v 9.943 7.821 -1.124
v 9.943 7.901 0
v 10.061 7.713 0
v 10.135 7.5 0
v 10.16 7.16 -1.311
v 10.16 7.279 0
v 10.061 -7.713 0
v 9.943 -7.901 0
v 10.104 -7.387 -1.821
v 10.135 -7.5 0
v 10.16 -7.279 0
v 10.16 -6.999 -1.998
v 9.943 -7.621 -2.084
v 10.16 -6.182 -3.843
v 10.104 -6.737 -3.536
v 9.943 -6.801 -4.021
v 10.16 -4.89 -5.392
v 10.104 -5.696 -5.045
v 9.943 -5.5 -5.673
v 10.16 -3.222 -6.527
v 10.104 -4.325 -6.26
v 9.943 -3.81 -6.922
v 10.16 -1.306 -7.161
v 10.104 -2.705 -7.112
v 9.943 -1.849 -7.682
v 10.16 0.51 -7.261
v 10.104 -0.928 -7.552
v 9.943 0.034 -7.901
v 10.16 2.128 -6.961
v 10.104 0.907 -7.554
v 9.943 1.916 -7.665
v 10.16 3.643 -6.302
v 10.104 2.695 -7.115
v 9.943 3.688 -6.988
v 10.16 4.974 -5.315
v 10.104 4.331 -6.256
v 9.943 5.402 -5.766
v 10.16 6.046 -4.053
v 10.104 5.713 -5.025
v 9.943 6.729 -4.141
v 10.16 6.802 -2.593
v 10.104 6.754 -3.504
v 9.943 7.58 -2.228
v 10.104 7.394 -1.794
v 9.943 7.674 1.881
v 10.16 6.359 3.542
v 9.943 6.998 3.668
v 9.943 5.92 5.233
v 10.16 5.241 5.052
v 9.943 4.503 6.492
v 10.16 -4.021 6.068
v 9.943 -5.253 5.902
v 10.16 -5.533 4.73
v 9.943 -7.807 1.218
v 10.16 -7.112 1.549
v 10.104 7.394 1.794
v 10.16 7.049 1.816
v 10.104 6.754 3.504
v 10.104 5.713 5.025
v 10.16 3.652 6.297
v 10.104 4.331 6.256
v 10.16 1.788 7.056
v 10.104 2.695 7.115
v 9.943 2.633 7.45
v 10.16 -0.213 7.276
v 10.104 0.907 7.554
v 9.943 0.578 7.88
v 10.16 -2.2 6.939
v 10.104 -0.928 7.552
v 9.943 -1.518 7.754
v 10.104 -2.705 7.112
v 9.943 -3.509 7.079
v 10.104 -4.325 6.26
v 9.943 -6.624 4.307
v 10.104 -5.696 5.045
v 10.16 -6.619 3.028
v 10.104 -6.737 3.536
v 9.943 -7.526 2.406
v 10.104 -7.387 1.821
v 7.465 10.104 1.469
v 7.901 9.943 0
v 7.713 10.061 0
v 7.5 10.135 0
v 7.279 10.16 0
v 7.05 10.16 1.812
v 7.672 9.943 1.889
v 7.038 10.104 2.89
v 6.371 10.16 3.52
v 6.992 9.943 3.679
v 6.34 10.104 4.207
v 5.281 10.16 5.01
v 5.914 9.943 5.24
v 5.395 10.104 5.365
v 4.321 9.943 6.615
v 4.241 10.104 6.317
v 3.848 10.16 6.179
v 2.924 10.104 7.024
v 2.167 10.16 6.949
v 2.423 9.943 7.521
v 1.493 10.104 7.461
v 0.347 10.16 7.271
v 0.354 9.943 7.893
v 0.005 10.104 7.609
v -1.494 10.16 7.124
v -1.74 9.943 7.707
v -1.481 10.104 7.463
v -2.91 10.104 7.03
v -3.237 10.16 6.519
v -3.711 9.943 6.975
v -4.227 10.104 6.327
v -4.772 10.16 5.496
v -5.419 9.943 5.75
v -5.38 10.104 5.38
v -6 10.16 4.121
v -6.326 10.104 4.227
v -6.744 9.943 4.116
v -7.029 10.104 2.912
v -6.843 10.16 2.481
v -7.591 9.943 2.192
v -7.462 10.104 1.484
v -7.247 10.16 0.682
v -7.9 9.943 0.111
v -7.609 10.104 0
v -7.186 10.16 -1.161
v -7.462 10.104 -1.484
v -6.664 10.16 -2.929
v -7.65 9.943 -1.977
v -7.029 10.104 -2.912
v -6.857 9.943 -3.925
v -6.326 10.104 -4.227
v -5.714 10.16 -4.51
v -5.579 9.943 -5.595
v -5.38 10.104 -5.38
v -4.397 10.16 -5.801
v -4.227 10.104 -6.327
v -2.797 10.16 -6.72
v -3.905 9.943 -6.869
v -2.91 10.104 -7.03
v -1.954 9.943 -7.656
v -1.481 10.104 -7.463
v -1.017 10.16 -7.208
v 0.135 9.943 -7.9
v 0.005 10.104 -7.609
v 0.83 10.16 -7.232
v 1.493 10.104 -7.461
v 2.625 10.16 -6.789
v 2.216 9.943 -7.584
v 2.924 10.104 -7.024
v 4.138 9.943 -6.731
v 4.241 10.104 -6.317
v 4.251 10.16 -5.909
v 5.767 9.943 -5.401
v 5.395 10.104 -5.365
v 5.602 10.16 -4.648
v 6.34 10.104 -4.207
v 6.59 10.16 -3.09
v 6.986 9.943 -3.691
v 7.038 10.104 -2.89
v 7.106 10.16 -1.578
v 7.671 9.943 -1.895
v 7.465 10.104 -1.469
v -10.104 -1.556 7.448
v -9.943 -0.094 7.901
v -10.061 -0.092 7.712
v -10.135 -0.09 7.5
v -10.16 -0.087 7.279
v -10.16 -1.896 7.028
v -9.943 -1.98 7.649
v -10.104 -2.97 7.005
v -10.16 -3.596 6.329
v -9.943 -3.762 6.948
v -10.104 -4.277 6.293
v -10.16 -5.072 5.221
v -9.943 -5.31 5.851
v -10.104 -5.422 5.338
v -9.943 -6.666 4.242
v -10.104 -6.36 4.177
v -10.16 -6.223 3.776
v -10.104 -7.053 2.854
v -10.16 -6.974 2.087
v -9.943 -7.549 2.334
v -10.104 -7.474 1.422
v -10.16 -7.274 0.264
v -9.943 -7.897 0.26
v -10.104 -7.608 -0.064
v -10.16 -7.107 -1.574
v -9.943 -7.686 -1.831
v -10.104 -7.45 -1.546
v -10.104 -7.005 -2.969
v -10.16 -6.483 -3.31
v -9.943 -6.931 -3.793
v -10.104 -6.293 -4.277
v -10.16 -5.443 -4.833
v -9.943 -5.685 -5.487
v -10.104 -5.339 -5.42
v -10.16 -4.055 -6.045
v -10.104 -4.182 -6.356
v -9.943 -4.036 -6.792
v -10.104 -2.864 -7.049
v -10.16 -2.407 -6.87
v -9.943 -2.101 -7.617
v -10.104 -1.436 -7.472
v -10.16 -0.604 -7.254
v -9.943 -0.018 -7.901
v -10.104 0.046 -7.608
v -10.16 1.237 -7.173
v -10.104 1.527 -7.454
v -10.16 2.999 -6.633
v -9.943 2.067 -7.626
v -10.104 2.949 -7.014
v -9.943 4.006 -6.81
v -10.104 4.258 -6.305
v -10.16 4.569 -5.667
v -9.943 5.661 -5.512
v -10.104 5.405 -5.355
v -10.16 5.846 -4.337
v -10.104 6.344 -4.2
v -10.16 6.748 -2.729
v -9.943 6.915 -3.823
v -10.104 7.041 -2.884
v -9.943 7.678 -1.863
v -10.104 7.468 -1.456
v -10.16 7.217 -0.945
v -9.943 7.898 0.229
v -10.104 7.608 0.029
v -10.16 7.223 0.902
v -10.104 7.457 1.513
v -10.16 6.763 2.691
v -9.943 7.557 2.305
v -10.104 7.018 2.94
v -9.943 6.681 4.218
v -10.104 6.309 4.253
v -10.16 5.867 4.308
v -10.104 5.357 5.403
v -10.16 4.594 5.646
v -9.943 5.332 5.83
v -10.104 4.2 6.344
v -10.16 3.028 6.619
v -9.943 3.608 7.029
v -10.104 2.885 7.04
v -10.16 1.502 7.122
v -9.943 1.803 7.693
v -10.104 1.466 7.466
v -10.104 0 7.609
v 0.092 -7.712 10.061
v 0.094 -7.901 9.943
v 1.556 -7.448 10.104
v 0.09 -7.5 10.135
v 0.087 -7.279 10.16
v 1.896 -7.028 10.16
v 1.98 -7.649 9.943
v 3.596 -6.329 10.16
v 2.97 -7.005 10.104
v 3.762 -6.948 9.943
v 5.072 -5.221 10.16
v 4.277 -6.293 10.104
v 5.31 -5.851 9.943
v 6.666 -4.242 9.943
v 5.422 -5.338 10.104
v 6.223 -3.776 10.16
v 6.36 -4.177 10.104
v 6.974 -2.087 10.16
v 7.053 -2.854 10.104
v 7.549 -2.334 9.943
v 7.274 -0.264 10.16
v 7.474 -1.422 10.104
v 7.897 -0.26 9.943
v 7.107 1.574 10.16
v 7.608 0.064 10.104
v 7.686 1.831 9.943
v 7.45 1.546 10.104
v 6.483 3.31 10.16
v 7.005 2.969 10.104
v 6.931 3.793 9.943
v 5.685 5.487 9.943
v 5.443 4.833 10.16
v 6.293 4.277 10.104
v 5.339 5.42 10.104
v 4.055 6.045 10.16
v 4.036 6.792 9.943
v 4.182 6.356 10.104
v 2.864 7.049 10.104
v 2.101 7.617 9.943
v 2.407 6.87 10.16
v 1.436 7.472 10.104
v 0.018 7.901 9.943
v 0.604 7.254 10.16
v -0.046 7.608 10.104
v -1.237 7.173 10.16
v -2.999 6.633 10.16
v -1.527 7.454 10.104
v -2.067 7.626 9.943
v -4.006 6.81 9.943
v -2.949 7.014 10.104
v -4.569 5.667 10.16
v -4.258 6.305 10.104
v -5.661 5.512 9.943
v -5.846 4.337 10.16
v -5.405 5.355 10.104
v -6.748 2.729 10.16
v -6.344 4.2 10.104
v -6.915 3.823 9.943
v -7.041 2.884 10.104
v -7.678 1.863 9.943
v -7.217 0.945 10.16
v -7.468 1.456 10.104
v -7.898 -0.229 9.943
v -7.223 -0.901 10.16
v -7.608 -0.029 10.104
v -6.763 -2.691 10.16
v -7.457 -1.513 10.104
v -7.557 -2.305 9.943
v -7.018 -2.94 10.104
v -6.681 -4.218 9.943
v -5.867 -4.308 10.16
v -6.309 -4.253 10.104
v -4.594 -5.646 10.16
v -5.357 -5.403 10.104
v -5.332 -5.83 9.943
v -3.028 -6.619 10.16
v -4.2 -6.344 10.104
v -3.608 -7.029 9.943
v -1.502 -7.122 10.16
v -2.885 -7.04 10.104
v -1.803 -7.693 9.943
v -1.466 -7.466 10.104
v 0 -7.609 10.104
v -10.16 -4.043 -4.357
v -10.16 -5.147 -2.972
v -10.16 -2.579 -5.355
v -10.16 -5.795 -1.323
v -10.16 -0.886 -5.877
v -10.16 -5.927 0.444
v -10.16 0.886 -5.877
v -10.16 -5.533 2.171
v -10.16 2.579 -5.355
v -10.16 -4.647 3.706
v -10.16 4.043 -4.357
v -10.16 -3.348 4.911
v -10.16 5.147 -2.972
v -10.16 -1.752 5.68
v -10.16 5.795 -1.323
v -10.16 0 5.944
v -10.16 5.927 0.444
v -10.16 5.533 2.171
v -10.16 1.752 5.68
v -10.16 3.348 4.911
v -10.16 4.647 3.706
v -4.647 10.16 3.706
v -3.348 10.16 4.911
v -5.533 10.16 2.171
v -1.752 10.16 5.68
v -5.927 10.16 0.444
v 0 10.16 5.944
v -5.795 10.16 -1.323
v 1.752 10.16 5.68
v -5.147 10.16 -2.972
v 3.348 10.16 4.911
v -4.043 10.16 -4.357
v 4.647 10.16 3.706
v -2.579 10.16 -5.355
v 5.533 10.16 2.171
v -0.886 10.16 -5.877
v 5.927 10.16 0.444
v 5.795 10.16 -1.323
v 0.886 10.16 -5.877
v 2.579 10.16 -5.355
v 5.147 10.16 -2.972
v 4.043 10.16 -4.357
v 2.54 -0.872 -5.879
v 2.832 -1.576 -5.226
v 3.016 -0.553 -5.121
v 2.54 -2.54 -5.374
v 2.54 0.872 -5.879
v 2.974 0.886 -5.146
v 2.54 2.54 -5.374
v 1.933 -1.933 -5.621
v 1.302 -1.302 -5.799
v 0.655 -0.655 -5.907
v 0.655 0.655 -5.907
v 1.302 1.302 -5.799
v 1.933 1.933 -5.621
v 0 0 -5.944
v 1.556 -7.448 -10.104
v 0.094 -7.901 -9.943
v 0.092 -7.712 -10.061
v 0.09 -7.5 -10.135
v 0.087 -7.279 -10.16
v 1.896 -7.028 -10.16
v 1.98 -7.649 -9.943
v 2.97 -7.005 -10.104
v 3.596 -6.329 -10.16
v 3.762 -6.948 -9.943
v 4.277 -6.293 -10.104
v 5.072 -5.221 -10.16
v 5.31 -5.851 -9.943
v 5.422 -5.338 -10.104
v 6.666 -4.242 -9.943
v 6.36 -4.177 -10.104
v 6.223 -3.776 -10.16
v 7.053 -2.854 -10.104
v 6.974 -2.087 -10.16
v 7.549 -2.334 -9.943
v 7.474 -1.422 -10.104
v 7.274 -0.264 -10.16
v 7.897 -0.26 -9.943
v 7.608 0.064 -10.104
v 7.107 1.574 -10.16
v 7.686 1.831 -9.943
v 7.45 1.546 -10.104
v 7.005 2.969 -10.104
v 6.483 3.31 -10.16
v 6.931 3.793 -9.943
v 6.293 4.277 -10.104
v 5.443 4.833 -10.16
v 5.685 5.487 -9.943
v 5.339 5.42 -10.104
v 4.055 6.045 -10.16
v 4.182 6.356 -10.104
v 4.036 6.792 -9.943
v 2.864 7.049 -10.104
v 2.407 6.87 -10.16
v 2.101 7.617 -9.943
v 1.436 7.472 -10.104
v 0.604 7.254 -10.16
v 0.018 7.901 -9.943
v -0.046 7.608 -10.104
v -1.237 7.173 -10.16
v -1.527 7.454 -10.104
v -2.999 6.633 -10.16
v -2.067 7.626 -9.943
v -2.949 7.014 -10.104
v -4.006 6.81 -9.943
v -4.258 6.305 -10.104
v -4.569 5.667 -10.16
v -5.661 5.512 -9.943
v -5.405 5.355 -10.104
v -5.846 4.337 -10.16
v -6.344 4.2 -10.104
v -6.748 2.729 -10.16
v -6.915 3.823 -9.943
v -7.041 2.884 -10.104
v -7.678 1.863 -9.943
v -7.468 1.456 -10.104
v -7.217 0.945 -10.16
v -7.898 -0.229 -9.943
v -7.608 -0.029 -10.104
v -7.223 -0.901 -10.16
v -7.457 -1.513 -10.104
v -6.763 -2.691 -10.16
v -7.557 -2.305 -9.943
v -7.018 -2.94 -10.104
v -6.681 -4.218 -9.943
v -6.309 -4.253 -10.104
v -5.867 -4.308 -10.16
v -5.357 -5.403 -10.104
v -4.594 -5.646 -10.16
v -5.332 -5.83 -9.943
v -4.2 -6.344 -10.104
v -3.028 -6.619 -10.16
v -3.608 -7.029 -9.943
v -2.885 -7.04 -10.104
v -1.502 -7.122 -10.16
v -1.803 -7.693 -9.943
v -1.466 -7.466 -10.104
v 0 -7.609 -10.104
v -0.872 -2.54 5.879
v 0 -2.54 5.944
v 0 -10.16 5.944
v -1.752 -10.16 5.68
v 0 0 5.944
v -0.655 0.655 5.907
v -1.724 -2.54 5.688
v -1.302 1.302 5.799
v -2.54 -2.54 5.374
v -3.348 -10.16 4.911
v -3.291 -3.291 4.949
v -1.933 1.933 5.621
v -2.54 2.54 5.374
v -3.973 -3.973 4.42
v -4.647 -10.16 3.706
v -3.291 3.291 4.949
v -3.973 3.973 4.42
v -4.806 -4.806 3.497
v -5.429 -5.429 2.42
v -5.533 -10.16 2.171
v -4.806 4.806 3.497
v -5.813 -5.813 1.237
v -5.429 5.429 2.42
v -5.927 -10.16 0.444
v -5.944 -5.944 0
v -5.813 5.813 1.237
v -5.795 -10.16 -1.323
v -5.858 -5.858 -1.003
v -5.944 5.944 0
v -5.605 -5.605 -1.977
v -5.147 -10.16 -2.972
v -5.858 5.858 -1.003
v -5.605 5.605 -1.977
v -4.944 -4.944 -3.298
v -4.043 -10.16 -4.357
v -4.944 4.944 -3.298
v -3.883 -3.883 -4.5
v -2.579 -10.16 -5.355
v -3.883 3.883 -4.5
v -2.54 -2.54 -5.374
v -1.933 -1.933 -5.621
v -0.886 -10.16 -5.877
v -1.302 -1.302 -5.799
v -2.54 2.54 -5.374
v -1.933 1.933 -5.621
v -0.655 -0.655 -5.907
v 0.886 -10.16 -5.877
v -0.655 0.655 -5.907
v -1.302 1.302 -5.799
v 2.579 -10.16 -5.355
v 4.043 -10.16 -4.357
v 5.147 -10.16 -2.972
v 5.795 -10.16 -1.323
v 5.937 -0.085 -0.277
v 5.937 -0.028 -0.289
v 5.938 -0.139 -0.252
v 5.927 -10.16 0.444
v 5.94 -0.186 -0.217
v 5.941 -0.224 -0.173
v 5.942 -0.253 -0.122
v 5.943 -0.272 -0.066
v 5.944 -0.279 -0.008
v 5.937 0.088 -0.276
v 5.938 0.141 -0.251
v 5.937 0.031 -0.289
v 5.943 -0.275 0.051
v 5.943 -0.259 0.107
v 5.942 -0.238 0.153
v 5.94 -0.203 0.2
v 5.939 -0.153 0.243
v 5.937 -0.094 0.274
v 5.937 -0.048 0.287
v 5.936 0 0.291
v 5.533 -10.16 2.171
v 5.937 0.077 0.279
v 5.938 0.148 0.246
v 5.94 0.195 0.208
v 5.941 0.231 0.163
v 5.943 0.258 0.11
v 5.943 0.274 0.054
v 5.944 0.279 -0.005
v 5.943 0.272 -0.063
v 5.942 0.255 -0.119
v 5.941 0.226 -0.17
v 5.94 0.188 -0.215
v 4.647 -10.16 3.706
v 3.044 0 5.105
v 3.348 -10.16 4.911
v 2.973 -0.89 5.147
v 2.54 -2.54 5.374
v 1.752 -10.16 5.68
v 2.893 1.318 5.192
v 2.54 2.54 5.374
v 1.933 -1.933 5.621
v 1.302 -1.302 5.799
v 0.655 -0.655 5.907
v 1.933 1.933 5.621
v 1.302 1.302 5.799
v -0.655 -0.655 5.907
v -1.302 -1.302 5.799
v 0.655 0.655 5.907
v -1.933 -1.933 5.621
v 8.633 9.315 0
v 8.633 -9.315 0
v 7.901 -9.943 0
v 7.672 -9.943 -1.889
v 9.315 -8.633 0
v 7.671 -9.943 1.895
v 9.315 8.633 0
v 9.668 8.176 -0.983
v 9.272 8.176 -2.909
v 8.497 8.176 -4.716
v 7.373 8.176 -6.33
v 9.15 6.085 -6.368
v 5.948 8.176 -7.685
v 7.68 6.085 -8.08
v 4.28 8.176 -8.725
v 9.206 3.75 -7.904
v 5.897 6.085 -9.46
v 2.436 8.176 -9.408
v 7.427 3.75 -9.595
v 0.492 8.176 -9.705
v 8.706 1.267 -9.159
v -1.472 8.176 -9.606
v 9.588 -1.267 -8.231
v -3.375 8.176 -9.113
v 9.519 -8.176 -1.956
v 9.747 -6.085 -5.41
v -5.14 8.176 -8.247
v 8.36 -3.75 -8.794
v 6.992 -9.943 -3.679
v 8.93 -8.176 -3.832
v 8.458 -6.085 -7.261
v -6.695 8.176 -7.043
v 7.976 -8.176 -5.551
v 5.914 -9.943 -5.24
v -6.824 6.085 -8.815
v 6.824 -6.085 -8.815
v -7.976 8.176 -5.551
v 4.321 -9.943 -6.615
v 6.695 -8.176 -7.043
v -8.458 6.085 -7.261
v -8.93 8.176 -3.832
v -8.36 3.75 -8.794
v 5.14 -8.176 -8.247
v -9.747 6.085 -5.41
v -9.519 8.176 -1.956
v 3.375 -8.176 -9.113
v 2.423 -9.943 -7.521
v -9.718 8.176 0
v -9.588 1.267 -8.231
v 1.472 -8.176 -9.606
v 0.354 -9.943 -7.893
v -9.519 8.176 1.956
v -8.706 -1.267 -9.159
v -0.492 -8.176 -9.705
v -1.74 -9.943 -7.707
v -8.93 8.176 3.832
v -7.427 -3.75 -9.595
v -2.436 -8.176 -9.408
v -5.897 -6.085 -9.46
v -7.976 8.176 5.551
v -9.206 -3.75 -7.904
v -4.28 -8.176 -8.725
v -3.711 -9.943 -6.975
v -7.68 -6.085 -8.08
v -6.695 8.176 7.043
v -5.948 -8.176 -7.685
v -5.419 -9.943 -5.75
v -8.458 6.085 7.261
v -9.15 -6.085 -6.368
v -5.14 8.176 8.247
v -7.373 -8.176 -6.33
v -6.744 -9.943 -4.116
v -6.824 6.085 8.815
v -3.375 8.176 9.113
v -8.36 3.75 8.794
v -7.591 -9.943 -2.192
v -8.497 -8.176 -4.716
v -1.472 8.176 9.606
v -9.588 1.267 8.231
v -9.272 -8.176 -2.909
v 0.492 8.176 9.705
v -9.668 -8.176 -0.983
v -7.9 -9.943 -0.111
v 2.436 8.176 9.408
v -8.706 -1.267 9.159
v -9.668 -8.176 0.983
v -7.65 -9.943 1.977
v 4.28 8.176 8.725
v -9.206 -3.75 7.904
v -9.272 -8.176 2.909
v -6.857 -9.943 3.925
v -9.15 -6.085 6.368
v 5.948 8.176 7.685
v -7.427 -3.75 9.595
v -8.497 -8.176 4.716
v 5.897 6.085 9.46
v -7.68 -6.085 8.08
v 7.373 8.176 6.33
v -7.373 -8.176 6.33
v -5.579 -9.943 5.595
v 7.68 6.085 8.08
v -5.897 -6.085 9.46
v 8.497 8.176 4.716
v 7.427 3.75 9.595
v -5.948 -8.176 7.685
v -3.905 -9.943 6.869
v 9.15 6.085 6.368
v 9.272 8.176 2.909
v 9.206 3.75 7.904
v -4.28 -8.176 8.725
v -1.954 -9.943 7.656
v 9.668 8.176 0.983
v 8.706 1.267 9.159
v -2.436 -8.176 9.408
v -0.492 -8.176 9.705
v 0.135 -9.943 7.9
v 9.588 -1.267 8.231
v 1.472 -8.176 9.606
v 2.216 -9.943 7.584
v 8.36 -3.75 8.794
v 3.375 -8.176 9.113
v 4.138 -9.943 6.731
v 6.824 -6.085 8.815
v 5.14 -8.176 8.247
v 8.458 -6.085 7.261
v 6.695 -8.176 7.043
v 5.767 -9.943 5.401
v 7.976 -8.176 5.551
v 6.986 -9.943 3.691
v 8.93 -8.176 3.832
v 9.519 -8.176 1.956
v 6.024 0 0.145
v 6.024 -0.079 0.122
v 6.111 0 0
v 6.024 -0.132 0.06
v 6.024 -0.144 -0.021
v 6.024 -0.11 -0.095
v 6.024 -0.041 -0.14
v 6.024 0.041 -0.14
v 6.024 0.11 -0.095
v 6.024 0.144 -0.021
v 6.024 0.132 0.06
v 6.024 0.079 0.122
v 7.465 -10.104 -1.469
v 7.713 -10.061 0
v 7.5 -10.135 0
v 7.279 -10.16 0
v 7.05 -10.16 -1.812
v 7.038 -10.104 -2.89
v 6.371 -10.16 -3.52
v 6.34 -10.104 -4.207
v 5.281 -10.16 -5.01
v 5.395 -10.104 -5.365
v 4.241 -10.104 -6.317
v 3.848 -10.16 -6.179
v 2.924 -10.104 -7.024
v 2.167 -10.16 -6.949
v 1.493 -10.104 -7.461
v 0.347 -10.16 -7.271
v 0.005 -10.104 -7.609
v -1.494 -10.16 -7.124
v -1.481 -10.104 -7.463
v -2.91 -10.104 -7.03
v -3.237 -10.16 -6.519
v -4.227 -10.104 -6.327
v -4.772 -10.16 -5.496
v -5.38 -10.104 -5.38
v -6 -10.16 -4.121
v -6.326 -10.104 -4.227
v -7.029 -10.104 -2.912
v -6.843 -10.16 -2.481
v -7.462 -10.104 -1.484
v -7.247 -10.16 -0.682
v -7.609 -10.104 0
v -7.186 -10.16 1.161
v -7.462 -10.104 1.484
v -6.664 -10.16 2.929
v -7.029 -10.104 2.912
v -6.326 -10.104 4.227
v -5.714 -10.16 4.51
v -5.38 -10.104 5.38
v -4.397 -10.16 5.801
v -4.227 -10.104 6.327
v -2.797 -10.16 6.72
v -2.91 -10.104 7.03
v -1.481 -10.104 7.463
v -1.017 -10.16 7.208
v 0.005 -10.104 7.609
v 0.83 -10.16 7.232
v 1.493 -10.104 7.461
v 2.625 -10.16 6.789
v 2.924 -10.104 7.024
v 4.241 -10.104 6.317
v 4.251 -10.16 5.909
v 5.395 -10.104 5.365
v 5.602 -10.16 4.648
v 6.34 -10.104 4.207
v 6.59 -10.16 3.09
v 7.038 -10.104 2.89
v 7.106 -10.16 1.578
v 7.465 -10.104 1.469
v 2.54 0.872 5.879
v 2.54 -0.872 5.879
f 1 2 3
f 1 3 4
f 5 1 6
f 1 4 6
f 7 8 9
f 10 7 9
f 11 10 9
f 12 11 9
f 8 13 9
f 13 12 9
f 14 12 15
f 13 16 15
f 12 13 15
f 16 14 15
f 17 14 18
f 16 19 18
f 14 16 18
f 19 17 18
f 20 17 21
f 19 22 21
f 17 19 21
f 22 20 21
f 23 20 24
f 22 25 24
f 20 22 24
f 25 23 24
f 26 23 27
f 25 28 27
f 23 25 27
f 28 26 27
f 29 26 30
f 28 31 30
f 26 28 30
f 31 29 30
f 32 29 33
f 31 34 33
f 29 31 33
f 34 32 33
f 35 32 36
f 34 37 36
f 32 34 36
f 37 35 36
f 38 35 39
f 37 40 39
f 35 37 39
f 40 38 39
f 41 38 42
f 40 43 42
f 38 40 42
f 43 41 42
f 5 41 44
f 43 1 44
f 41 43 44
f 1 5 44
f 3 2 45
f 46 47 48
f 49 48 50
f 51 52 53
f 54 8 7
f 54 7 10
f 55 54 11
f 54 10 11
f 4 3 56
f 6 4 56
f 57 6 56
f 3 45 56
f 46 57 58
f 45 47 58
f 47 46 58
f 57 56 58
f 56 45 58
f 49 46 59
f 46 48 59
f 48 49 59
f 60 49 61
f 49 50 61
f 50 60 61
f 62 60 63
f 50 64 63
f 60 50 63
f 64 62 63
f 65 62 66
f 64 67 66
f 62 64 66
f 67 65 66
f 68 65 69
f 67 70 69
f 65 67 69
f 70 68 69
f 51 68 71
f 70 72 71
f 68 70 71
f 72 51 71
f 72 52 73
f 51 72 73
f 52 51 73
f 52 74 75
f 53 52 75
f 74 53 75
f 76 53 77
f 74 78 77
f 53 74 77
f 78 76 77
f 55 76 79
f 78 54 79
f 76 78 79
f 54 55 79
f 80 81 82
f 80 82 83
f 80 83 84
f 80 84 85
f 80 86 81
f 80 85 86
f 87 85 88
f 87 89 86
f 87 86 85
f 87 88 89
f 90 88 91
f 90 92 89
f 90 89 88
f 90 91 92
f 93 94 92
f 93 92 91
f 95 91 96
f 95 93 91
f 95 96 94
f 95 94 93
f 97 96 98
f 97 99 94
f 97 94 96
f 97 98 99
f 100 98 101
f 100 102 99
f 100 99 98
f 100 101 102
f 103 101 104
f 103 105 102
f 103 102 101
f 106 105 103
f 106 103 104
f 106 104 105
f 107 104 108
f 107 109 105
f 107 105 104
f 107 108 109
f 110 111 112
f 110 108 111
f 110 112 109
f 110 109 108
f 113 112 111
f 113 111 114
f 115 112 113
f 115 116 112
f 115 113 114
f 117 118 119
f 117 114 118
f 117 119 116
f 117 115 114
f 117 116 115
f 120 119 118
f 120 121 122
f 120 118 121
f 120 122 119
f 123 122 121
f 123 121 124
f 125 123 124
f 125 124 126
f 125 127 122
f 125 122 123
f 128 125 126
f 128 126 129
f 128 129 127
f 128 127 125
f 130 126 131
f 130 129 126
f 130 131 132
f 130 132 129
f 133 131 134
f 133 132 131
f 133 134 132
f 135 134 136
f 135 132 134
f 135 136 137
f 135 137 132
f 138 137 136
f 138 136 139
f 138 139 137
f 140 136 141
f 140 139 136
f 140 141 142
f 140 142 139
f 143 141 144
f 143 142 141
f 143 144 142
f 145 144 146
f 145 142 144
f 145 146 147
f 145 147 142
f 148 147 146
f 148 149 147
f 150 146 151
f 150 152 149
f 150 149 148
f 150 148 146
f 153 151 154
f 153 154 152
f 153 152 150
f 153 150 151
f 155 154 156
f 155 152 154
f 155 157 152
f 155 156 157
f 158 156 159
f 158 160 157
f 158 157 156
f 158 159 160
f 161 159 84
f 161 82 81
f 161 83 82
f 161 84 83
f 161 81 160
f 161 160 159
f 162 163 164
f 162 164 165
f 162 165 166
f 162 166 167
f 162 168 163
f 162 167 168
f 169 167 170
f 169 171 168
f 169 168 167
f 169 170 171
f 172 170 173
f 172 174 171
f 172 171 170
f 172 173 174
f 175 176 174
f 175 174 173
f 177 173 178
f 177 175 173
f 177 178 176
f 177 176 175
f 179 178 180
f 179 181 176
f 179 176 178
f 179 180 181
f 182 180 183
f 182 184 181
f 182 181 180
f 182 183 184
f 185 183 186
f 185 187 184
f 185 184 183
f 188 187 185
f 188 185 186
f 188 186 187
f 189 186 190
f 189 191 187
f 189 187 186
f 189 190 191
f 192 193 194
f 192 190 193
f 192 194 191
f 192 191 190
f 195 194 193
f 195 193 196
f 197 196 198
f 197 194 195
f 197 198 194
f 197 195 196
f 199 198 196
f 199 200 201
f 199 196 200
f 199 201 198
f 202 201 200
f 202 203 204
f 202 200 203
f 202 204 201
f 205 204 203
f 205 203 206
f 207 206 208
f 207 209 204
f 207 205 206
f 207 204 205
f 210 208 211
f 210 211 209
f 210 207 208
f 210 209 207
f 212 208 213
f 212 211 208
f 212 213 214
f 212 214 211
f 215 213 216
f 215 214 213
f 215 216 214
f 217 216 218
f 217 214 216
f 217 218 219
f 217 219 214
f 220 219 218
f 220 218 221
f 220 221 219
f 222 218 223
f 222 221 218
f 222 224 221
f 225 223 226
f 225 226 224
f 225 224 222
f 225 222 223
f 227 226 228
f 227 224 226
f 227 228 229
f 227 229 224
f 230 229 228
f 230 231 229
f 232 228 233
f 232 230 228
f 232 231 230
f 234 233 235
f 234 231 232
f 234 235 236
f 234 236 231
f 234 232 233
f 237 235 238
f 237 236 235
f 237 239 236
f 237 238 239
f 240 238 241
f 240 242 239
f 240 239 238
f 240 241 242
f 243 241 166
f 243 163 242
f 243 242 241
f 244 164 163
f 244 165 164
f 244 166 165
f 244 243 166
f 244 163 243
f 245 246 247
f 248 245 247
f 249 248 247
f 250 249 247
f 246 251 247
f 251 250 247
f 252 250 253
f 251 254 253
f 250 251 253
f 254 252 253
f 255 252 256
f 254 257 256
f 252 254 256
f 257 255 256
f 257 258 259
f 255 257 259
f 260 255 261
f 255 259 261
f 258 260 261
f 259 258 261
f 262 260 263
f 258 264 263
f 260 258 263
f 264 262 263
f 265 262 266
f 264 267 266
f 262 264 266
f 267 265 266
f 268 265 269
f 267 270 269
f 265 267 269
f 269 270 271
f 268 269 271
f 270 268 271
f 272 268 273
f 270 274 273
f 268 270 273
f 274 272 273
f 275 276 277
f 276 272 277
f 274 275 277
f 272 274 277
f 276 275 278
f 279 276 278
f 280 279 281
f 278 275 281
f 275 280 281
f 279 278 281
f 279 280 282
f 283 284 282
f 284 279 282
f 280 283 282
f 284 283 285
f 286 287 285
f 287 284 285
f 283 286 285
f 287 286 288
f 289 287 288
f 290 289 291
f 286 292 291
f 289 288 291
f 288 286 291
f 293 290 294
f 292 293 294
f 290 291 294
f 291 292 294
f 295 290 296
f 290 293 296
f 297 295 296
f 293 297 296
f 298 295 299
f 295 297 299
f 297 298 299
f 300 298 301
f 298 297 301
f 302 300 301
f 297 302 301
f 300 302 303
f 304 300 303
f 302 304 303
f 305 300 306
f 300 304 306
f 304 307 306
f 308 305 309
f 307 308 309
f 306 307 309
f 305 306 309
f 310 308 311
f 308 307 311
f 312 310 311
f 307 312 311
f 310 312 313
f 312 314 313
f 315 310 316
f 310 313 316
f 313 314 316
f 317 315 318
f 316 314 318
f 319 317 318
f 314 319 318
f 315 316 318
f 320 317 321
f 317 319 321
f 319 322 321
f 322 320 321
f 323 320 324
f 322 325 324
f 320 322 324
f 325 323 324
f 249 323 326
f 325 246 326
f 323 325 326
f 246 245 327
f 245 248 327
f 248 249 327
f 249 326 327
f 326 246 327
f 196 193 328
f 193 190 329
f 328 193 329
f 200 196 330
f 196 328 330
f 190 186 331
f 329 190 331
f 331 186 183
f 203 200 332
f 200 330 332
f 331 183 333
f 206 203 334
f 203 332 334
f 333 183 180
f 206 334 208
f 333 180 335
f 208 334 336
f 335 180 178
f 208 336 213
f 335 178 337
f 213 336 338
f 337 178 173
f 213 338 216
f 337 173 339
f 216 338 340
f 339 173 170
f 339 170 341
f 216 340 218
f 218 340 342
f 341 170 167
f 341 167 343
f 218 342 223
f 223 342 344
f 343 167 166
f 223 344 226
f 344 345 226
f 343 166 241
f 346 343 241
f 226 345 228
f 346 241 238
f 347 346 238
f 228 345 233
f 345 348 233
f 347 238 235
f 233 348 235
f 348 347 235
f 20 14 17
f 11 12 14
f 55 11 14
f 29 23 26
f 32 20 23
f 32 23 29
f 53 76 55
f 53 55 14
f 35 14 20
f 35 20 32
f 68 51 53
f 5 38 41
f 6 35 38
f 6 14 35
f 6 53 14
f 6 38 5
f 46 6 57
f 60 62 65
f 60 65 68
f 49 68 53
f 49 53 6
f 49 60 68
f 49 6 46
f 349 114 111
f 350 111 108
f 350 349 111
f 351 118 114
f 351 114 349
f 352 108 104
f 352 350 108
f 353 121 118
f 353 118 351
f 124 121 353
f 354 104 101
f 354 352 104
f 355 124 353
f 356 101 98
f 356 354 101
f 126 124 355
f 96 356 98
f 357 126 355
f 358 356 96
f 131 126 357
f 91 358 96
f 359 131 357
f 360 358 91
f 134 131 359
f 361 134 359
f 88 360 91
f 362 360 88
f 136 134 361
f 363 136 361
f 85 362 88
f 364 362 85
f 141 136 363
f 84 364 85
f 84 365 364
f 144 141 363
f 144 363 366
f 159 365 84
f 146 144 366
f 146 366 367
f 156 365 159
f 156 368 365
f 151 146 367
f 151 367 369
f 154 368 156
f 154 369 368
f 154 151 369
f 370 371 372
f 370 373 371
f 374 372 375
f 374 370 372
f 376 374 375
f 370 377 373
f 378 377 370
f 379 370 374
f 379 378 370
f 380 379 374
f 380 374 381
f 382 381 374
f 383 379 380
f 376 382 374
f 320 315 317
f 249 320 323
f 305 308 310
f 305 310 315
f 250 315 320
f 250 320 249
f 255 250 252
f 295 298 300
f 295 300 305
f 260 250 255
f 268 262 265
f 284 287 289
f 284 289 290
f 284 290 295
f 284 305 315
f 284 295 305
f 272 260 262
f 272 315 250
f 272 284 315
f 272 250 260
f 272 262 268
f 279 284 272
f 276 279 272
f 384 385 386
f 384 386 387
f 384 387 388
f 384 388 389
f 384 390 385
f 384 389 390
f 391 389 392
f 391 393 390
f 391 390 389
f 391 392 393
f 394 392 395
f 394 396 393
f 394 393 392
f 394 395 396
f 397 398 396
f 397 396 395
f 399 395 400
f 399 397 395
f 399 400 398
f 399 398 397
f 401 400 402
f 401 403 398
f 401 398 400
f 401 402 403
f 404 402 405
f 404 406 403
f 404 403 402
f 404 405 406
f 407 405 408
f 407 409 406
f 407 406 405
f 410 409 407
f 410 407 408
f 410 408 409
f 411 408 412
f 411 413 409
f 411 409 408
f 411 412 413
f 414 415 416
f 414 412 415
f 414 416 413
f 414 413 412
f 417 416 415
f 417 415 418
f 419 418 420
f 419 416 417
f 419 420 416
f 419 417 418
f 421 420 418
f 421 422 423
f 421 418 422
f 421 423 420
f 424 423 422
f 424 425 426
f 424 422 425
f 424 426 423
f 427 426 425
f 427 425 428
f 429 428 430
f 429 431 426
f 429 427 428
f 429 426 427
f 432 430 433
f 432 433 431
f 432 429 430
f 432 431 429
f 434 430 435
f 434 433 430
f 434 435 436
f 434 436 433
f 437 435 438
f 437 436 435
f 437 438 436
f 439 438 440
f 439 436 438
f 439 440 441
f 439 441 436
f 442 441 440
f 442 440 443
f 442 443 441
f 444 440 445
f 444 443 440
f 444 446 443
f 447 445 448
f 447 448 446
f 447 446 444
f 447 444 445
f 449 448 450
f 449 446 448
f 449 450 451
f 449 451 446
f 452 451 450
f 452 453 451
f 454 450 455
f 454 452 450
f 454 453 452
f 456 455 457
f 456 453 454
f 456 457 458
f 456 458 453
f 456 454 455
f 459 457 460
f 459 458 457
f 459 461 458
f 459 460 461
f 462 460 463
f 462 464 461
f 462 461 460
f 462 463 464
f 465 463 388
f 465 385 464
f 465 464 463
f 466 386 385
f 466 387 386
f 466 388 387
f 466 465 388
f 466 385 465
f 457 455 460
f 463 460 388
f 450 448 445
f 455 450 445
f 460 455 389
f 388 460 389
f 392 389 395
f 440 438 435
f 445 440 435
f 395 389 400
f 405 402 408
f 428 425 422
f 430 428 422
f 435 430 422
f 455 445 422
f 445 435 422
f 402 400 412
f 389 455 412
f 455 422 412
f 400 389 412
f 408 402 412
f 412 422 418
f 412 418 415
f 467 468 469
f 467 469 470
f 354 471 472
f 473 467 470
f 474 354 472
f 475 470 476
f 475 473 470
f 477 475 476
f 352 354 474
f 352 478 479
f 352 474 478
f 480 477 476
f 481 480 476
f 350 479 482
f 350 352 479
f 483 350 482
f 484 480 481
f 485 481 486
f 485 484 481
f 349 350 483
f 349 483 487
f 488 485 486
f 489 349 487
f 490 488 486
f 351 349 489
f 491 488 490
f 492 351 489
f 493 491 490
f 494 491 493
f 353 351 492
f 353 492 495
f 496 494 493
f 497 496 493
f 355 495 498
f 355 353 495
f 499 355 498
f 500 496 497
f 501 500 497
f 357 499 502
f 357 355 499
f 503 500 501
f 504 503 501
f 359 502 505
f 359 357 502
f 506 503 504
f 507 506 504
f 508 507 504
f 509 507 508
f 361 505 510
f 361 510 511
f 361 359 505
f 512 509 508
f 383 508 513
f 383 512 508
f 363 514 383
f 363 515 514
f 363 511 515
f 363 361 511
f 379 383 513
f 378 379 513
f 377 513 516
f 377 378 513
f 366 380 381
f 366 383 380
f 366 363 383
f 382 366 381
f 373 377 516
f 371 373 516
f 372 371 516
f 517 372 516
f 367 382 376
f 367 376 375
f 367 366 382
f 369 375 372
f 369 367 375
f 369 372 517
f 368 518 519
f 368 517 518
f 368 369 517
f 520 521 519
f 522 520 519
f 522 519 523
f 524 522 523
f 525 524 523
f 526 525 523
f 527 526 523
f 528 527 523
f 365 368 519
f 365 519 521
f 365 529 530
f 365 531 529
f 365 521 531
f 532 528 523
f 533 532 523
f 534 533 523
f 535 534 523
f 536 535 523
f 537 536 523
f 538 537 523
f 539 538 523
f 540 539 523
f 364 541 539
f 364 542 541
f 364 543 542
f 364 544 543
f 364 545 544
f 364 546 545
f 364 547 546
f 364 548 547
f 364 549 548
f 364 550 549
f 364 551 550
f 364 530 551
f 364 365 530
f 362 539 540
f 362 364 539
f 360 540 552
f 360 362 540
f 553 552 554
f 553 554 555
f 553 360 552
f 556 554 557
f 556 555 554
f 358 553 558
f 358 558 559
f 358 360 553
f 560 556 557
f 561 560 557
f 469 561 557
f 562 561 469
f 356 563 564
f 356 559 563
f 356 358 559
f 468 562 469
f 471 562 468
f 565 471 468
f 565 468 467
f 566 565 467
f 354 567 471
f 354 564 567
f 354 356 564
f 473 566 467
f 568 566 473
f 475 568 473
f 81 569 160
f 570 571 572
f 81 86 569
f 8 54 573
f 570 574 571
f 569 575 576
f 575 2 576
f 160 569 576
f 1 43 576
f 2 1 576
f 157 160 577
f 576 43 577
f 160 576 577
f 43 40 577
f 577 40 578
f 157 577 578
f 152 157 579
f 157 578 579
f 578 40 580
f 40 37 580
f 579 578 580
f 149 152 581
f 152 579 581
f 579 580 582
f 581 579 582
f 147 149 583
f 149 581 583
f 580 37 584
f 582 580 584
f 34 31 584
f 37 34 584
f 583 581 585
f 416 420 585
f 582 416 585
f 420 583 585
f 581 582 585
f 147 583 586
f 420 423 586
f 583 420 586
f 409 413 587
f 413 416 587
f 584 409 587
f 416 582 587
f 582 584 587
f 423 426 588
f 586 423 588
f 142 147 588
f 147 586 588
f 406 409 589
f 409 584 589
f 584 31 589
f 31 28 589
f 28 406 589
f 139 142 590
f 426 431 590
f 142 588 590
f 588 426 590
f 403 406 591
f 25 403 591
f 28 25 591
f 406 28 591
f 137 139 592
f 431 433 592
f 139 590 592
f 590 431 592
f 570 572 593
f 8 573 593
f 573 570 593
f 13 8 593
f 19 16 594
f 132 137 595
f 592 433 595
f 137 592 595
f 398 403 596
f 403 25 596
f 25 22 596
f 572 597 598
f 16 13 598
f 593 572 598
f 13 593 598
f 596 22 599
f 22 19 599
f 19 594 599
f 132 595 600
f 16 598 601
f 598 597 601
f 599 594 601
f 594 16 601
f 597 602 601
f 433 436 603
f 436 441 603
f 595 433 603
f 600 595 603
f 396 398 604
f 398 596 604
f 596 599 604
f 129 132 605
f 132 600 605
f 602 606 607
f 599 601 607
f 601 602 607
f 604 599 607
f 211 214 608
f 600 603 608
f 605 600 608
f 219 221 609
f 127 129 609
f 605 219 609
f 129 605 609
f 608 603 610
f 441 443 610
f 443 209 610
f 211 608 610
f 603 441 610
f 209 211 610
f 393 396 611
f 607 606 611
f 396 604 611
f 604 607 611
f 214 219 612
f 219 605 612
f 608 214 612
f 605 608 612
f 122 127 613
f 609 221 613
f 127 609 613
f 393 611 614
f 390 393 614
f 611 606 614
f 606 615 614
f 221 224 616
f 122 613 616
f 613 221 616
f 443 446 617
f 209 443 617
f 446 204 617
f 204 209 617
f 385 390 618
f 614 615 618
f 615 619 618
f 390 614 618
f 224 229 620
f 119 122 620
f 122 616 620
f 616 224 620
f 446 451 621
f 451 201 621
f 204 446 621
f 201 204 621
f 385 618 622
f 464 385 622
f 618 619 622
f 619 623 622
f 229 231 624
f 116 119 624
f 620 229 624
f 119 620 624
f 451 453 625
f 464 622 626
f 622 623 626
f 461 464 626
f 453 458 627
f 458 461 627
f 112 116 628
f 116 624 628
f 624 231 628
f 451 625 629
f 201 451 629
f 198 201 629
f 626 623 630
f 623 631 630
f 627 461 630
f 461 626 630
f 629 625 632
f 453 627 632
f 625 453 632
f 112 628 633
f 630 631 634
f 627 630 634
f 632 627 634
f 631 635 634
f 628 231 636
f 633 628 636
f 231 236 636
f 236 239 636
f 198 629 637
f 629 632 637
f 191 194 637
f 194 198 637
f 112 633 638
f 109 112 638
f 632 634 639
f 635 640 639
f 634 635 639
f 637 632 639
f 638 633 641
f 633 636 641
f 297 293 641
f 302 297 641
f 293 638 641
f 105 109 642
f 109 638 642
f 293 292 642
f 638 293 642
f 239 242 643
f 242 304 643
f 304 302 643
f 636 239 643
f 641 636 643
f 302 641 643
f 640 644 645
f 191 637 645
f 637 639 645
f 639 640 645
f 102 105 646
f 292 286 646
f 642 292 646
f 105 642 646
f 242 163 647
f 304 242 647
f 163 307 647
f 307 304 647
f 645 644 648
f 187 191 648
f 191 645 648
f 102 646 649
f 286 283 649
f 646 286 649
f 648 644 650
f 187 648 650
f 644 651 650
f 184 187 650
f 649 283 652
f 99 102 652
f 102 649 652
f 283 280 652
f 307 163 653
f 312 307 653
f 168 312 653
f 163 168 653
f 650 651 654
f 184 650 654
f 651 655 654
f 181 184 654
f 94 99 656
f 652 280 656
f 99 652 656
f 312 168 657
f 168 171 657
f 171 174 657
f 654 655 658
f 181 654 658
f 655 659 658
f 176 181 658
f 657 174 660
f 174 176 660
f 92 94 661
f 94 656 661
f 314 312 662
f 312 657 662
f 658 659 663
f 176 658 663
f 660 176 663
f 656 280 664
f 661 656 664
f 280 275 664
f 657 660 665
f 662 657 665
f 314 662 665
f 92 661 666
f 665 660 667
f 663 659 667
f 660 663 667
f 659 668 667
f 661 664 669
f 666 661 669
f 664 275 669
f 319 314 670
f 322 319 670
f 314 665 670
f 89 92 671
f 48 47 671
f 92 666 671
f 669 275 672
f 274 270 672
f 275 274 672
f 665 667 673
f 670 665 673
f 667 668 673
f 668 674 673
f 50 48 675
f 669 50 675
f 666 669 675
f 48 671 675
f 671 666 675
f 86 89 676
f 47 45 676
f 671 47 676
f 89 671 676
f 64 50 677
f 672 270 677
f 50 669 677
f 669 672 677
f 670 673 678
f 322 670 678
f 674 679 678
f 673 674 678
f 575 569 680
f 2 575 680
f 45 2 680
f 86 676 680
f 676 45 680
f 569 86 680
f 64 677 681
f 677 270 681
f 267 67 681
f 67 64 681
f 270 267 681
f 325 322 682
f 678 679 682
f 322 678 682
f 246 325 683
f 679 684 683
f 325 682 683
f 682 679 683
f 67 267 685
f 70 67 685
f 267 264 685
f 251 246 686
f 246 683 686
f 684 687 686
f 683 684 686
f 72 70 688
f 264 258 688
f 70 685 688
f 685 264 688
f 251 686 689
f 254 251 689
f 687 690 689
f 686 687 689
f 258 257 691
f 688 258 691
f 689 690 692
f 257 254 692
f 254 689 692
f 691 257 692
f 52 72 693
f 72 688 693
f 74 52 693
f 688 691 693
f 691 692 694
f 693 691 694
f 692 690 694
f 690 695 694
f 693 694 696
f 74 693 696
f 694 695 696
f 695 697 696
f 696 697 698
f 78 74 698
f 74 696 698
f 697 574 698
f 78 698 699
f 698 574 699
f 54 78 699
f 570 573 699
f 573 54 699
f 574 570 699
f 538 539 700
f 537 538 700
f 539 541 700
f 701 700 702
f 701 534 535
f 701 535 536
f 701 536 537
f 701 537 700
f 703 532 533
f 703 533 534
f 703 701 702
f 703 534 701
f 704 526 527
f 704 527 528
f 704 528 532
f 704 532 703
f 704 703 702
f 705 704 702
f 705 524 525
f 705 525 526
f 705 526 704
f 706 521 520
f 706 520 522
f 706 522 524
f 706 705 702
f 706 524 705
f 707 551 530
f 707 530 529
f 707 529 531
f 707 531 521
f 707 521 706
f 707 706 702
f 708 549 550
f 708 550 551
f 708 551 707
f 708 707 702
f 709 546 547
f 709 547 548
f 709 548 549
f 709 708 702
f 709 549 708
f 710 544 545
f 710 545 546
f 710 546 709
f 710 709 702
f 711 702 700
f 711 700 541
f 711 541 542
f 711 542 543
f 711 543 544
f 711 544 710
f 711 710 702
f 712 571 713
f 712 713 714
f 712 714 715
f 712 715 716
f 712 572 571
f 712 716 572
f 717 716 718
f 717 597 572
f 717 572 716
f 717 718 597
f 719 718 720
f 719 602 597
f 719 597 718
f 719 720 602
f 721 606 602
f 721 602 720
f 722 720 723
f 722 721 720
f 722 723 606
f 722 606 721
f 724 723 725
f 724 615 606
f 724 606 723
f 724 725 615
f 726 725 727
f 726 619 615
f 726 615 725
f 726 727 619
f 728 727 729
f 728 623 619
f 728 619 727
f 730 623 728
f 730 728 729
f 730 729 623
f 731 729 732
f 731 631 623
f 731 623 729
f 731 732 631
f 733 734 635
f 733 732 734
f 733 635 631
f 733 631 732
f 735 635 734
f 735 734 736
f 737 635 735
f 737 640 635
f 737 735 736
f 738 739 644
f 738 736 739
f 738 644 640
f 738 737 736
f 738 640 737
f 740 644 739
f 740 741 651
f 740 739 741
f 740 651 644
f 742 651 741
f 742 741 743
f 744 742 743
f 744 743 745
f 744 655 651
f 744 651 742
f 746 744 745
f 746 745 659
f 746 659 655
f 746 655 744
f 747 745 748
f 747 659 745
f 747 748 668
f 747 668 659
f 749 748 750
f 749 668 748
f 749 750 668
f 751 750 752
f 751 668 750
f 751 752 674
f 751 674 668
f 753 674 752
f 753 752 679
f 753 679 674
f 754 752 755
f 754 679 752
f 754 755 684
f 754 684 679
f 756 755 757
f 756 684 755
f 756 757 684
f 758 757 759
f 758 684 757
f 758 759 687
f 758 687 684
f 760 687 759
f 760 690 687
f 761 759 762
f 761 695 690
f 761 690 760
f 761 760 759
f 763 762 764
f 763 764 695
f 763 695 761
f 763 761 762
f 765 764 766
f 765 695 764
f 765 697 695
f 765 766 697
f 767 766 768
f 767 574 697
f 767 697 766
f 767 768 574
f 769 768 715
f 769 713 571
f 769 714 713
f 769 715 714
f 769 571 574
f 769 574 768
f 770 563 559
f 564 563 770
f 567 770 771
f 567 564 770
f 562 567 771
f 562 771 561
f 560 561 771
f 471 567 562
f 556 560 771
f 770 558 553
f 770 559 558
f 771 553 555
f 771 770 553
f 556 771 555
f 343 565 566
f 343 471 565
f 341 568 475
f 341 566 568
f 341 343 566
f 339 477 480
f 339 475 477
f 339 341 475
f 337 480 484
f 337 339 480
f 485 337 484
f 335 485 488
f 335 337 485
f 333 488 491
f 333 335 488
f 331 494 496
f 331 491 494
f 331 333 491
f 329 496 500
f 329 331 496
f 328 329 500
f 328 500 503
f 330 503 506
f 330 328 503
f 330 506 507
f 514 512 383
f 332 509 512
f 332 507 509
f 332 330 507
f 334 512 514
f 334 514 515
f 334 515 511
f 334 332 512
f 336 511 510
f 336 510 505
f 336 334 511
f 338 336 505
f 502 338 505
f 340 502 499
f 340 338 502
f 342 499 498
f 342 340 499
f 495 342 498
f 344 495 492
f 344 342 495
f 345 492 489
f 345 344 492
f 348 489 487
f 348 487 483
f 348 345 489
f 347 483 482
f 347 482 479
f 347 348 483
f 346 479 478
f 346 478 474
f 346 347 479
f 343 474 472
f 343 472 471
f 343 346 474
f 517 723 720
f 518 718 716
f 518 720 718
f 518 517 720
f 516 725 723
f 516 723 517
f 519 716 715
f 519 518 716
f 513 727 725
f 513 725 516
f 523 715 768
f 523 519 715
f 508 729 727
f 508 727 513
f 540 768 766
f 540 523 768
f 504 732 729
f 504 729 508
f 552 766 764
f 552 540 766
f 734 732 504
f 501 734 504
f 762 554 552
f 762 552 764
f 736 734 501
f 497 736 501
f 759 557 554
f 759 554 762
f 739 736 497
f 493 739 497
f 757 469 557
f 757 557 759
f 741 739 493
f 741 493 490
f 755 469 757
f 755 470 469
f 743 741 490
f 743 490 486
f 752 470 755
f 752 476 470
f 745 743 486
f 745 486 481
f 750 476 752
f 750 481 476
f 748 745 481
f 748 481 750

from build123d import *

# Parameters (mm, degrees)
R_P_TITION_START                   = -7.62
R_P_TITION_CIRCULAIRE5_OUTLINE_W   = 3.84
R_P_TITION_CIRCULAIRE5_OUTLINE_H   = 18
R_P_TITION_CIRCULAIRE5_DEPTH       = 15.24
R_P_TITION_START_2                 = -12.7
R_P_TITION_CIRCULAIRE5_2_OUTLINE_W = 19.16
R_P_TITION_CIRCULAIRE5_2_OUTLINE_H = 18
R_P_TITION_CIRCULAIRE5_2_DEPTH     = 2.54
R_P_TITION_START_3                 = 10.16
R_P_TITION_CIRCULAIRE5_3_OUTLINE_W = 19.16
R_P_TITION_CIRCULAIRE5_3_OUTLINE_H = 18
R_P_TITION_CIRCULAIRE5_3_DEPTH     = 2.54
R_P_TITION_CIRCULAIRE6_OUTLINE_W   = 18
R_P_TITION_CIRCULAIRE6_OUTLINE_H   = 18
R_P_TITION_CIRCULAIRE6_DEPTH       = 2.54
R_P_TITION_CIRCULAIRE6_2_OUTLINE_W = 18
R_P_TITION_CIRCULAIRE6_2_OUTLINE_H = 18
R_P_TITION_CIRCULAIRE6_2_DEPTH     = 2.54
CONG_1_R                           = 1
R_P_TITION_CIRCULAIRE7_COUNT       = 3
R_P_TITION_CIRCULAIRE7_ANGLE       = 180


# Read off the part's stored shape, not the designer's step: Répétition circulaire5, Répétition circulaire6
with BuildPart() as part:
    # Esquisse1 → Révolution1 (revolve)
    with BuildSketch(Plane.XY):
        with BuildLine():
            Line((0, -12.7), (0, 12.7))
            ThreePointArc((0, 12.7), (12.7, 0), (0, -12.7))
        make_face()
    revolve(axis=Axis((0, -12.7, 0), (0, 1, 0)))

    # Enlèv. mat.-Surface1
    split(bisect_by=Plane(origin=(0, 10.16, 0), x_dir=(1, 0, 0), z_dir=(0, 1, 0)), keep=Keep.BOTTOM)

    # Répétition circulaire5 outline → Répétition circulaire5 (cut)
    with BuildSketch(Plane.YZ.offset(R_P_TITION_START)):
        with Locations((-12.08, 0)):
            Rectangle(R_P_TITION_CIRCULAIRE5_OUTLINE_W, R_P_TITION_CIRCULAIRE5_OUTLINE_H)
    extrude(amount=R_P_TITION_CIRCULAIRE5_DEPTH, mode=Mode.SUBTRACT)

    # R_p_tition circulaire5 2 outline → R_p_tition circulaire5 2 (cut)
    with BuildSketch(Plane.YZ.offset(R_P_TITION_START_2)):
        with Locations((-0.58, 0)):
            Rectangle(R_P_TITION_CIRCULAIRE5_2_OUTLINE_W, R_P_TITION_CIRCULAIRE5_2_OUTLINE_H)
    extrude(amount=R_P_TITION_CIRCULAIRE5_2_DEPTH, mode=Mode.SUBTRACT)

    # R_p_tition circulaire5 3 outline → R_p_tition circulaire5 3 (cut)
    with BuildSketch(Plane.YZ.offset(R_P_TITION_START_3)):
        with Locations((-0.58, 0)):
            Rectangle(R_P_TITION_CIRCULAIRE5_3_OUTLINE_W, R_P_TITION_CIRCULAIRE5_3_OUTLINE_H)
    extrude(amount=R_P_TITION_CIRCULAIRE5_3_DEPTH, mode=Mode.SUBTRACT)

    # Répétition circulaire6 outline → Répétition circulaire6 (cut)
    with BuildSketch(Plane.XY.offset(R_P_TITION_START_2)):
        Rectangle(R_P_TITION_CIRCULAIRE6_OUTLINE_W, R_P_TITION_CIRCULAIRE6_OUTLINE_H)
    extrude(amount=R_P_TITION_CIRCULAIRE6_DEPTH, mode=Mode.SUBTRACT)

    # R_p_tition circulaire6 2 outline → R_p_tition circulaire6 2 (cut)
    with BuildSketch(Plane.XY.offset(R_P_TITION_START_3)):
        Rectangle(R_P_TITION_CIRCULAIRE6_2_OUTLINE_W, R_P_TITION_CIRCULAIRE6_2_OUTLINE_H)
    extrude(amount=R_P_TITION_CIRCULAIRE6_2_DEPTH, mode=Mode.SUBTRACT)

    # Congé1
    cong_1_edges = [part.edges().sort_by_distance(p)[0] for p in [
        (-10.16, 0, -7.62),
        (-7.62, -10.16, 0),
        (10.16, 0, -7.62),
        (0, 7.62, -10.16),
        (0, 7.62, 10.16),
        (-7.62, 10.16, 0),
    ]]
    fillet(cong_1_edges, radius=CONG_1_R)

    # Esquisse2 → Trou taraudé 1/4-18 NPSM1 (revolve, cut)
    with BuildSketch(Plane(origin=(0, 10.16, 0), x_dir=(0, 0, 1), z_dir=(1, 0, 0))):
        Polygon((0, 0), (0, 16.271275175), (5.9436, 12.7), (5.9436, 0), align=None)
    trou_taraud_1_4_18_npsm1 = revolve(axis=Axis((0, 16.51, 0), (0, -1, 0)), mode=Mode.SUBTRACT)

    # Répétition circulaire7: Trou taraudé 1/4-18 NPSM1 ×3 about axis
    r_p_tition_circulaire7_axis = Axis((0, 0, -11.176), (0, 0, 1))
    for i in range(1, R_P_TITION_CIRCULAIRE7_COUNT):
        add(trou_taraud_1_4_18_npsm1.rotate(r_p_tition_circulaire7_axis, i * R_P_TITION_CIRCULAIRE7_ANGLE / (R_P_TITION_CIRCULAIRE7_COUNT - 1)), mode=Mode.SUBTRACT)


solid = part.part
